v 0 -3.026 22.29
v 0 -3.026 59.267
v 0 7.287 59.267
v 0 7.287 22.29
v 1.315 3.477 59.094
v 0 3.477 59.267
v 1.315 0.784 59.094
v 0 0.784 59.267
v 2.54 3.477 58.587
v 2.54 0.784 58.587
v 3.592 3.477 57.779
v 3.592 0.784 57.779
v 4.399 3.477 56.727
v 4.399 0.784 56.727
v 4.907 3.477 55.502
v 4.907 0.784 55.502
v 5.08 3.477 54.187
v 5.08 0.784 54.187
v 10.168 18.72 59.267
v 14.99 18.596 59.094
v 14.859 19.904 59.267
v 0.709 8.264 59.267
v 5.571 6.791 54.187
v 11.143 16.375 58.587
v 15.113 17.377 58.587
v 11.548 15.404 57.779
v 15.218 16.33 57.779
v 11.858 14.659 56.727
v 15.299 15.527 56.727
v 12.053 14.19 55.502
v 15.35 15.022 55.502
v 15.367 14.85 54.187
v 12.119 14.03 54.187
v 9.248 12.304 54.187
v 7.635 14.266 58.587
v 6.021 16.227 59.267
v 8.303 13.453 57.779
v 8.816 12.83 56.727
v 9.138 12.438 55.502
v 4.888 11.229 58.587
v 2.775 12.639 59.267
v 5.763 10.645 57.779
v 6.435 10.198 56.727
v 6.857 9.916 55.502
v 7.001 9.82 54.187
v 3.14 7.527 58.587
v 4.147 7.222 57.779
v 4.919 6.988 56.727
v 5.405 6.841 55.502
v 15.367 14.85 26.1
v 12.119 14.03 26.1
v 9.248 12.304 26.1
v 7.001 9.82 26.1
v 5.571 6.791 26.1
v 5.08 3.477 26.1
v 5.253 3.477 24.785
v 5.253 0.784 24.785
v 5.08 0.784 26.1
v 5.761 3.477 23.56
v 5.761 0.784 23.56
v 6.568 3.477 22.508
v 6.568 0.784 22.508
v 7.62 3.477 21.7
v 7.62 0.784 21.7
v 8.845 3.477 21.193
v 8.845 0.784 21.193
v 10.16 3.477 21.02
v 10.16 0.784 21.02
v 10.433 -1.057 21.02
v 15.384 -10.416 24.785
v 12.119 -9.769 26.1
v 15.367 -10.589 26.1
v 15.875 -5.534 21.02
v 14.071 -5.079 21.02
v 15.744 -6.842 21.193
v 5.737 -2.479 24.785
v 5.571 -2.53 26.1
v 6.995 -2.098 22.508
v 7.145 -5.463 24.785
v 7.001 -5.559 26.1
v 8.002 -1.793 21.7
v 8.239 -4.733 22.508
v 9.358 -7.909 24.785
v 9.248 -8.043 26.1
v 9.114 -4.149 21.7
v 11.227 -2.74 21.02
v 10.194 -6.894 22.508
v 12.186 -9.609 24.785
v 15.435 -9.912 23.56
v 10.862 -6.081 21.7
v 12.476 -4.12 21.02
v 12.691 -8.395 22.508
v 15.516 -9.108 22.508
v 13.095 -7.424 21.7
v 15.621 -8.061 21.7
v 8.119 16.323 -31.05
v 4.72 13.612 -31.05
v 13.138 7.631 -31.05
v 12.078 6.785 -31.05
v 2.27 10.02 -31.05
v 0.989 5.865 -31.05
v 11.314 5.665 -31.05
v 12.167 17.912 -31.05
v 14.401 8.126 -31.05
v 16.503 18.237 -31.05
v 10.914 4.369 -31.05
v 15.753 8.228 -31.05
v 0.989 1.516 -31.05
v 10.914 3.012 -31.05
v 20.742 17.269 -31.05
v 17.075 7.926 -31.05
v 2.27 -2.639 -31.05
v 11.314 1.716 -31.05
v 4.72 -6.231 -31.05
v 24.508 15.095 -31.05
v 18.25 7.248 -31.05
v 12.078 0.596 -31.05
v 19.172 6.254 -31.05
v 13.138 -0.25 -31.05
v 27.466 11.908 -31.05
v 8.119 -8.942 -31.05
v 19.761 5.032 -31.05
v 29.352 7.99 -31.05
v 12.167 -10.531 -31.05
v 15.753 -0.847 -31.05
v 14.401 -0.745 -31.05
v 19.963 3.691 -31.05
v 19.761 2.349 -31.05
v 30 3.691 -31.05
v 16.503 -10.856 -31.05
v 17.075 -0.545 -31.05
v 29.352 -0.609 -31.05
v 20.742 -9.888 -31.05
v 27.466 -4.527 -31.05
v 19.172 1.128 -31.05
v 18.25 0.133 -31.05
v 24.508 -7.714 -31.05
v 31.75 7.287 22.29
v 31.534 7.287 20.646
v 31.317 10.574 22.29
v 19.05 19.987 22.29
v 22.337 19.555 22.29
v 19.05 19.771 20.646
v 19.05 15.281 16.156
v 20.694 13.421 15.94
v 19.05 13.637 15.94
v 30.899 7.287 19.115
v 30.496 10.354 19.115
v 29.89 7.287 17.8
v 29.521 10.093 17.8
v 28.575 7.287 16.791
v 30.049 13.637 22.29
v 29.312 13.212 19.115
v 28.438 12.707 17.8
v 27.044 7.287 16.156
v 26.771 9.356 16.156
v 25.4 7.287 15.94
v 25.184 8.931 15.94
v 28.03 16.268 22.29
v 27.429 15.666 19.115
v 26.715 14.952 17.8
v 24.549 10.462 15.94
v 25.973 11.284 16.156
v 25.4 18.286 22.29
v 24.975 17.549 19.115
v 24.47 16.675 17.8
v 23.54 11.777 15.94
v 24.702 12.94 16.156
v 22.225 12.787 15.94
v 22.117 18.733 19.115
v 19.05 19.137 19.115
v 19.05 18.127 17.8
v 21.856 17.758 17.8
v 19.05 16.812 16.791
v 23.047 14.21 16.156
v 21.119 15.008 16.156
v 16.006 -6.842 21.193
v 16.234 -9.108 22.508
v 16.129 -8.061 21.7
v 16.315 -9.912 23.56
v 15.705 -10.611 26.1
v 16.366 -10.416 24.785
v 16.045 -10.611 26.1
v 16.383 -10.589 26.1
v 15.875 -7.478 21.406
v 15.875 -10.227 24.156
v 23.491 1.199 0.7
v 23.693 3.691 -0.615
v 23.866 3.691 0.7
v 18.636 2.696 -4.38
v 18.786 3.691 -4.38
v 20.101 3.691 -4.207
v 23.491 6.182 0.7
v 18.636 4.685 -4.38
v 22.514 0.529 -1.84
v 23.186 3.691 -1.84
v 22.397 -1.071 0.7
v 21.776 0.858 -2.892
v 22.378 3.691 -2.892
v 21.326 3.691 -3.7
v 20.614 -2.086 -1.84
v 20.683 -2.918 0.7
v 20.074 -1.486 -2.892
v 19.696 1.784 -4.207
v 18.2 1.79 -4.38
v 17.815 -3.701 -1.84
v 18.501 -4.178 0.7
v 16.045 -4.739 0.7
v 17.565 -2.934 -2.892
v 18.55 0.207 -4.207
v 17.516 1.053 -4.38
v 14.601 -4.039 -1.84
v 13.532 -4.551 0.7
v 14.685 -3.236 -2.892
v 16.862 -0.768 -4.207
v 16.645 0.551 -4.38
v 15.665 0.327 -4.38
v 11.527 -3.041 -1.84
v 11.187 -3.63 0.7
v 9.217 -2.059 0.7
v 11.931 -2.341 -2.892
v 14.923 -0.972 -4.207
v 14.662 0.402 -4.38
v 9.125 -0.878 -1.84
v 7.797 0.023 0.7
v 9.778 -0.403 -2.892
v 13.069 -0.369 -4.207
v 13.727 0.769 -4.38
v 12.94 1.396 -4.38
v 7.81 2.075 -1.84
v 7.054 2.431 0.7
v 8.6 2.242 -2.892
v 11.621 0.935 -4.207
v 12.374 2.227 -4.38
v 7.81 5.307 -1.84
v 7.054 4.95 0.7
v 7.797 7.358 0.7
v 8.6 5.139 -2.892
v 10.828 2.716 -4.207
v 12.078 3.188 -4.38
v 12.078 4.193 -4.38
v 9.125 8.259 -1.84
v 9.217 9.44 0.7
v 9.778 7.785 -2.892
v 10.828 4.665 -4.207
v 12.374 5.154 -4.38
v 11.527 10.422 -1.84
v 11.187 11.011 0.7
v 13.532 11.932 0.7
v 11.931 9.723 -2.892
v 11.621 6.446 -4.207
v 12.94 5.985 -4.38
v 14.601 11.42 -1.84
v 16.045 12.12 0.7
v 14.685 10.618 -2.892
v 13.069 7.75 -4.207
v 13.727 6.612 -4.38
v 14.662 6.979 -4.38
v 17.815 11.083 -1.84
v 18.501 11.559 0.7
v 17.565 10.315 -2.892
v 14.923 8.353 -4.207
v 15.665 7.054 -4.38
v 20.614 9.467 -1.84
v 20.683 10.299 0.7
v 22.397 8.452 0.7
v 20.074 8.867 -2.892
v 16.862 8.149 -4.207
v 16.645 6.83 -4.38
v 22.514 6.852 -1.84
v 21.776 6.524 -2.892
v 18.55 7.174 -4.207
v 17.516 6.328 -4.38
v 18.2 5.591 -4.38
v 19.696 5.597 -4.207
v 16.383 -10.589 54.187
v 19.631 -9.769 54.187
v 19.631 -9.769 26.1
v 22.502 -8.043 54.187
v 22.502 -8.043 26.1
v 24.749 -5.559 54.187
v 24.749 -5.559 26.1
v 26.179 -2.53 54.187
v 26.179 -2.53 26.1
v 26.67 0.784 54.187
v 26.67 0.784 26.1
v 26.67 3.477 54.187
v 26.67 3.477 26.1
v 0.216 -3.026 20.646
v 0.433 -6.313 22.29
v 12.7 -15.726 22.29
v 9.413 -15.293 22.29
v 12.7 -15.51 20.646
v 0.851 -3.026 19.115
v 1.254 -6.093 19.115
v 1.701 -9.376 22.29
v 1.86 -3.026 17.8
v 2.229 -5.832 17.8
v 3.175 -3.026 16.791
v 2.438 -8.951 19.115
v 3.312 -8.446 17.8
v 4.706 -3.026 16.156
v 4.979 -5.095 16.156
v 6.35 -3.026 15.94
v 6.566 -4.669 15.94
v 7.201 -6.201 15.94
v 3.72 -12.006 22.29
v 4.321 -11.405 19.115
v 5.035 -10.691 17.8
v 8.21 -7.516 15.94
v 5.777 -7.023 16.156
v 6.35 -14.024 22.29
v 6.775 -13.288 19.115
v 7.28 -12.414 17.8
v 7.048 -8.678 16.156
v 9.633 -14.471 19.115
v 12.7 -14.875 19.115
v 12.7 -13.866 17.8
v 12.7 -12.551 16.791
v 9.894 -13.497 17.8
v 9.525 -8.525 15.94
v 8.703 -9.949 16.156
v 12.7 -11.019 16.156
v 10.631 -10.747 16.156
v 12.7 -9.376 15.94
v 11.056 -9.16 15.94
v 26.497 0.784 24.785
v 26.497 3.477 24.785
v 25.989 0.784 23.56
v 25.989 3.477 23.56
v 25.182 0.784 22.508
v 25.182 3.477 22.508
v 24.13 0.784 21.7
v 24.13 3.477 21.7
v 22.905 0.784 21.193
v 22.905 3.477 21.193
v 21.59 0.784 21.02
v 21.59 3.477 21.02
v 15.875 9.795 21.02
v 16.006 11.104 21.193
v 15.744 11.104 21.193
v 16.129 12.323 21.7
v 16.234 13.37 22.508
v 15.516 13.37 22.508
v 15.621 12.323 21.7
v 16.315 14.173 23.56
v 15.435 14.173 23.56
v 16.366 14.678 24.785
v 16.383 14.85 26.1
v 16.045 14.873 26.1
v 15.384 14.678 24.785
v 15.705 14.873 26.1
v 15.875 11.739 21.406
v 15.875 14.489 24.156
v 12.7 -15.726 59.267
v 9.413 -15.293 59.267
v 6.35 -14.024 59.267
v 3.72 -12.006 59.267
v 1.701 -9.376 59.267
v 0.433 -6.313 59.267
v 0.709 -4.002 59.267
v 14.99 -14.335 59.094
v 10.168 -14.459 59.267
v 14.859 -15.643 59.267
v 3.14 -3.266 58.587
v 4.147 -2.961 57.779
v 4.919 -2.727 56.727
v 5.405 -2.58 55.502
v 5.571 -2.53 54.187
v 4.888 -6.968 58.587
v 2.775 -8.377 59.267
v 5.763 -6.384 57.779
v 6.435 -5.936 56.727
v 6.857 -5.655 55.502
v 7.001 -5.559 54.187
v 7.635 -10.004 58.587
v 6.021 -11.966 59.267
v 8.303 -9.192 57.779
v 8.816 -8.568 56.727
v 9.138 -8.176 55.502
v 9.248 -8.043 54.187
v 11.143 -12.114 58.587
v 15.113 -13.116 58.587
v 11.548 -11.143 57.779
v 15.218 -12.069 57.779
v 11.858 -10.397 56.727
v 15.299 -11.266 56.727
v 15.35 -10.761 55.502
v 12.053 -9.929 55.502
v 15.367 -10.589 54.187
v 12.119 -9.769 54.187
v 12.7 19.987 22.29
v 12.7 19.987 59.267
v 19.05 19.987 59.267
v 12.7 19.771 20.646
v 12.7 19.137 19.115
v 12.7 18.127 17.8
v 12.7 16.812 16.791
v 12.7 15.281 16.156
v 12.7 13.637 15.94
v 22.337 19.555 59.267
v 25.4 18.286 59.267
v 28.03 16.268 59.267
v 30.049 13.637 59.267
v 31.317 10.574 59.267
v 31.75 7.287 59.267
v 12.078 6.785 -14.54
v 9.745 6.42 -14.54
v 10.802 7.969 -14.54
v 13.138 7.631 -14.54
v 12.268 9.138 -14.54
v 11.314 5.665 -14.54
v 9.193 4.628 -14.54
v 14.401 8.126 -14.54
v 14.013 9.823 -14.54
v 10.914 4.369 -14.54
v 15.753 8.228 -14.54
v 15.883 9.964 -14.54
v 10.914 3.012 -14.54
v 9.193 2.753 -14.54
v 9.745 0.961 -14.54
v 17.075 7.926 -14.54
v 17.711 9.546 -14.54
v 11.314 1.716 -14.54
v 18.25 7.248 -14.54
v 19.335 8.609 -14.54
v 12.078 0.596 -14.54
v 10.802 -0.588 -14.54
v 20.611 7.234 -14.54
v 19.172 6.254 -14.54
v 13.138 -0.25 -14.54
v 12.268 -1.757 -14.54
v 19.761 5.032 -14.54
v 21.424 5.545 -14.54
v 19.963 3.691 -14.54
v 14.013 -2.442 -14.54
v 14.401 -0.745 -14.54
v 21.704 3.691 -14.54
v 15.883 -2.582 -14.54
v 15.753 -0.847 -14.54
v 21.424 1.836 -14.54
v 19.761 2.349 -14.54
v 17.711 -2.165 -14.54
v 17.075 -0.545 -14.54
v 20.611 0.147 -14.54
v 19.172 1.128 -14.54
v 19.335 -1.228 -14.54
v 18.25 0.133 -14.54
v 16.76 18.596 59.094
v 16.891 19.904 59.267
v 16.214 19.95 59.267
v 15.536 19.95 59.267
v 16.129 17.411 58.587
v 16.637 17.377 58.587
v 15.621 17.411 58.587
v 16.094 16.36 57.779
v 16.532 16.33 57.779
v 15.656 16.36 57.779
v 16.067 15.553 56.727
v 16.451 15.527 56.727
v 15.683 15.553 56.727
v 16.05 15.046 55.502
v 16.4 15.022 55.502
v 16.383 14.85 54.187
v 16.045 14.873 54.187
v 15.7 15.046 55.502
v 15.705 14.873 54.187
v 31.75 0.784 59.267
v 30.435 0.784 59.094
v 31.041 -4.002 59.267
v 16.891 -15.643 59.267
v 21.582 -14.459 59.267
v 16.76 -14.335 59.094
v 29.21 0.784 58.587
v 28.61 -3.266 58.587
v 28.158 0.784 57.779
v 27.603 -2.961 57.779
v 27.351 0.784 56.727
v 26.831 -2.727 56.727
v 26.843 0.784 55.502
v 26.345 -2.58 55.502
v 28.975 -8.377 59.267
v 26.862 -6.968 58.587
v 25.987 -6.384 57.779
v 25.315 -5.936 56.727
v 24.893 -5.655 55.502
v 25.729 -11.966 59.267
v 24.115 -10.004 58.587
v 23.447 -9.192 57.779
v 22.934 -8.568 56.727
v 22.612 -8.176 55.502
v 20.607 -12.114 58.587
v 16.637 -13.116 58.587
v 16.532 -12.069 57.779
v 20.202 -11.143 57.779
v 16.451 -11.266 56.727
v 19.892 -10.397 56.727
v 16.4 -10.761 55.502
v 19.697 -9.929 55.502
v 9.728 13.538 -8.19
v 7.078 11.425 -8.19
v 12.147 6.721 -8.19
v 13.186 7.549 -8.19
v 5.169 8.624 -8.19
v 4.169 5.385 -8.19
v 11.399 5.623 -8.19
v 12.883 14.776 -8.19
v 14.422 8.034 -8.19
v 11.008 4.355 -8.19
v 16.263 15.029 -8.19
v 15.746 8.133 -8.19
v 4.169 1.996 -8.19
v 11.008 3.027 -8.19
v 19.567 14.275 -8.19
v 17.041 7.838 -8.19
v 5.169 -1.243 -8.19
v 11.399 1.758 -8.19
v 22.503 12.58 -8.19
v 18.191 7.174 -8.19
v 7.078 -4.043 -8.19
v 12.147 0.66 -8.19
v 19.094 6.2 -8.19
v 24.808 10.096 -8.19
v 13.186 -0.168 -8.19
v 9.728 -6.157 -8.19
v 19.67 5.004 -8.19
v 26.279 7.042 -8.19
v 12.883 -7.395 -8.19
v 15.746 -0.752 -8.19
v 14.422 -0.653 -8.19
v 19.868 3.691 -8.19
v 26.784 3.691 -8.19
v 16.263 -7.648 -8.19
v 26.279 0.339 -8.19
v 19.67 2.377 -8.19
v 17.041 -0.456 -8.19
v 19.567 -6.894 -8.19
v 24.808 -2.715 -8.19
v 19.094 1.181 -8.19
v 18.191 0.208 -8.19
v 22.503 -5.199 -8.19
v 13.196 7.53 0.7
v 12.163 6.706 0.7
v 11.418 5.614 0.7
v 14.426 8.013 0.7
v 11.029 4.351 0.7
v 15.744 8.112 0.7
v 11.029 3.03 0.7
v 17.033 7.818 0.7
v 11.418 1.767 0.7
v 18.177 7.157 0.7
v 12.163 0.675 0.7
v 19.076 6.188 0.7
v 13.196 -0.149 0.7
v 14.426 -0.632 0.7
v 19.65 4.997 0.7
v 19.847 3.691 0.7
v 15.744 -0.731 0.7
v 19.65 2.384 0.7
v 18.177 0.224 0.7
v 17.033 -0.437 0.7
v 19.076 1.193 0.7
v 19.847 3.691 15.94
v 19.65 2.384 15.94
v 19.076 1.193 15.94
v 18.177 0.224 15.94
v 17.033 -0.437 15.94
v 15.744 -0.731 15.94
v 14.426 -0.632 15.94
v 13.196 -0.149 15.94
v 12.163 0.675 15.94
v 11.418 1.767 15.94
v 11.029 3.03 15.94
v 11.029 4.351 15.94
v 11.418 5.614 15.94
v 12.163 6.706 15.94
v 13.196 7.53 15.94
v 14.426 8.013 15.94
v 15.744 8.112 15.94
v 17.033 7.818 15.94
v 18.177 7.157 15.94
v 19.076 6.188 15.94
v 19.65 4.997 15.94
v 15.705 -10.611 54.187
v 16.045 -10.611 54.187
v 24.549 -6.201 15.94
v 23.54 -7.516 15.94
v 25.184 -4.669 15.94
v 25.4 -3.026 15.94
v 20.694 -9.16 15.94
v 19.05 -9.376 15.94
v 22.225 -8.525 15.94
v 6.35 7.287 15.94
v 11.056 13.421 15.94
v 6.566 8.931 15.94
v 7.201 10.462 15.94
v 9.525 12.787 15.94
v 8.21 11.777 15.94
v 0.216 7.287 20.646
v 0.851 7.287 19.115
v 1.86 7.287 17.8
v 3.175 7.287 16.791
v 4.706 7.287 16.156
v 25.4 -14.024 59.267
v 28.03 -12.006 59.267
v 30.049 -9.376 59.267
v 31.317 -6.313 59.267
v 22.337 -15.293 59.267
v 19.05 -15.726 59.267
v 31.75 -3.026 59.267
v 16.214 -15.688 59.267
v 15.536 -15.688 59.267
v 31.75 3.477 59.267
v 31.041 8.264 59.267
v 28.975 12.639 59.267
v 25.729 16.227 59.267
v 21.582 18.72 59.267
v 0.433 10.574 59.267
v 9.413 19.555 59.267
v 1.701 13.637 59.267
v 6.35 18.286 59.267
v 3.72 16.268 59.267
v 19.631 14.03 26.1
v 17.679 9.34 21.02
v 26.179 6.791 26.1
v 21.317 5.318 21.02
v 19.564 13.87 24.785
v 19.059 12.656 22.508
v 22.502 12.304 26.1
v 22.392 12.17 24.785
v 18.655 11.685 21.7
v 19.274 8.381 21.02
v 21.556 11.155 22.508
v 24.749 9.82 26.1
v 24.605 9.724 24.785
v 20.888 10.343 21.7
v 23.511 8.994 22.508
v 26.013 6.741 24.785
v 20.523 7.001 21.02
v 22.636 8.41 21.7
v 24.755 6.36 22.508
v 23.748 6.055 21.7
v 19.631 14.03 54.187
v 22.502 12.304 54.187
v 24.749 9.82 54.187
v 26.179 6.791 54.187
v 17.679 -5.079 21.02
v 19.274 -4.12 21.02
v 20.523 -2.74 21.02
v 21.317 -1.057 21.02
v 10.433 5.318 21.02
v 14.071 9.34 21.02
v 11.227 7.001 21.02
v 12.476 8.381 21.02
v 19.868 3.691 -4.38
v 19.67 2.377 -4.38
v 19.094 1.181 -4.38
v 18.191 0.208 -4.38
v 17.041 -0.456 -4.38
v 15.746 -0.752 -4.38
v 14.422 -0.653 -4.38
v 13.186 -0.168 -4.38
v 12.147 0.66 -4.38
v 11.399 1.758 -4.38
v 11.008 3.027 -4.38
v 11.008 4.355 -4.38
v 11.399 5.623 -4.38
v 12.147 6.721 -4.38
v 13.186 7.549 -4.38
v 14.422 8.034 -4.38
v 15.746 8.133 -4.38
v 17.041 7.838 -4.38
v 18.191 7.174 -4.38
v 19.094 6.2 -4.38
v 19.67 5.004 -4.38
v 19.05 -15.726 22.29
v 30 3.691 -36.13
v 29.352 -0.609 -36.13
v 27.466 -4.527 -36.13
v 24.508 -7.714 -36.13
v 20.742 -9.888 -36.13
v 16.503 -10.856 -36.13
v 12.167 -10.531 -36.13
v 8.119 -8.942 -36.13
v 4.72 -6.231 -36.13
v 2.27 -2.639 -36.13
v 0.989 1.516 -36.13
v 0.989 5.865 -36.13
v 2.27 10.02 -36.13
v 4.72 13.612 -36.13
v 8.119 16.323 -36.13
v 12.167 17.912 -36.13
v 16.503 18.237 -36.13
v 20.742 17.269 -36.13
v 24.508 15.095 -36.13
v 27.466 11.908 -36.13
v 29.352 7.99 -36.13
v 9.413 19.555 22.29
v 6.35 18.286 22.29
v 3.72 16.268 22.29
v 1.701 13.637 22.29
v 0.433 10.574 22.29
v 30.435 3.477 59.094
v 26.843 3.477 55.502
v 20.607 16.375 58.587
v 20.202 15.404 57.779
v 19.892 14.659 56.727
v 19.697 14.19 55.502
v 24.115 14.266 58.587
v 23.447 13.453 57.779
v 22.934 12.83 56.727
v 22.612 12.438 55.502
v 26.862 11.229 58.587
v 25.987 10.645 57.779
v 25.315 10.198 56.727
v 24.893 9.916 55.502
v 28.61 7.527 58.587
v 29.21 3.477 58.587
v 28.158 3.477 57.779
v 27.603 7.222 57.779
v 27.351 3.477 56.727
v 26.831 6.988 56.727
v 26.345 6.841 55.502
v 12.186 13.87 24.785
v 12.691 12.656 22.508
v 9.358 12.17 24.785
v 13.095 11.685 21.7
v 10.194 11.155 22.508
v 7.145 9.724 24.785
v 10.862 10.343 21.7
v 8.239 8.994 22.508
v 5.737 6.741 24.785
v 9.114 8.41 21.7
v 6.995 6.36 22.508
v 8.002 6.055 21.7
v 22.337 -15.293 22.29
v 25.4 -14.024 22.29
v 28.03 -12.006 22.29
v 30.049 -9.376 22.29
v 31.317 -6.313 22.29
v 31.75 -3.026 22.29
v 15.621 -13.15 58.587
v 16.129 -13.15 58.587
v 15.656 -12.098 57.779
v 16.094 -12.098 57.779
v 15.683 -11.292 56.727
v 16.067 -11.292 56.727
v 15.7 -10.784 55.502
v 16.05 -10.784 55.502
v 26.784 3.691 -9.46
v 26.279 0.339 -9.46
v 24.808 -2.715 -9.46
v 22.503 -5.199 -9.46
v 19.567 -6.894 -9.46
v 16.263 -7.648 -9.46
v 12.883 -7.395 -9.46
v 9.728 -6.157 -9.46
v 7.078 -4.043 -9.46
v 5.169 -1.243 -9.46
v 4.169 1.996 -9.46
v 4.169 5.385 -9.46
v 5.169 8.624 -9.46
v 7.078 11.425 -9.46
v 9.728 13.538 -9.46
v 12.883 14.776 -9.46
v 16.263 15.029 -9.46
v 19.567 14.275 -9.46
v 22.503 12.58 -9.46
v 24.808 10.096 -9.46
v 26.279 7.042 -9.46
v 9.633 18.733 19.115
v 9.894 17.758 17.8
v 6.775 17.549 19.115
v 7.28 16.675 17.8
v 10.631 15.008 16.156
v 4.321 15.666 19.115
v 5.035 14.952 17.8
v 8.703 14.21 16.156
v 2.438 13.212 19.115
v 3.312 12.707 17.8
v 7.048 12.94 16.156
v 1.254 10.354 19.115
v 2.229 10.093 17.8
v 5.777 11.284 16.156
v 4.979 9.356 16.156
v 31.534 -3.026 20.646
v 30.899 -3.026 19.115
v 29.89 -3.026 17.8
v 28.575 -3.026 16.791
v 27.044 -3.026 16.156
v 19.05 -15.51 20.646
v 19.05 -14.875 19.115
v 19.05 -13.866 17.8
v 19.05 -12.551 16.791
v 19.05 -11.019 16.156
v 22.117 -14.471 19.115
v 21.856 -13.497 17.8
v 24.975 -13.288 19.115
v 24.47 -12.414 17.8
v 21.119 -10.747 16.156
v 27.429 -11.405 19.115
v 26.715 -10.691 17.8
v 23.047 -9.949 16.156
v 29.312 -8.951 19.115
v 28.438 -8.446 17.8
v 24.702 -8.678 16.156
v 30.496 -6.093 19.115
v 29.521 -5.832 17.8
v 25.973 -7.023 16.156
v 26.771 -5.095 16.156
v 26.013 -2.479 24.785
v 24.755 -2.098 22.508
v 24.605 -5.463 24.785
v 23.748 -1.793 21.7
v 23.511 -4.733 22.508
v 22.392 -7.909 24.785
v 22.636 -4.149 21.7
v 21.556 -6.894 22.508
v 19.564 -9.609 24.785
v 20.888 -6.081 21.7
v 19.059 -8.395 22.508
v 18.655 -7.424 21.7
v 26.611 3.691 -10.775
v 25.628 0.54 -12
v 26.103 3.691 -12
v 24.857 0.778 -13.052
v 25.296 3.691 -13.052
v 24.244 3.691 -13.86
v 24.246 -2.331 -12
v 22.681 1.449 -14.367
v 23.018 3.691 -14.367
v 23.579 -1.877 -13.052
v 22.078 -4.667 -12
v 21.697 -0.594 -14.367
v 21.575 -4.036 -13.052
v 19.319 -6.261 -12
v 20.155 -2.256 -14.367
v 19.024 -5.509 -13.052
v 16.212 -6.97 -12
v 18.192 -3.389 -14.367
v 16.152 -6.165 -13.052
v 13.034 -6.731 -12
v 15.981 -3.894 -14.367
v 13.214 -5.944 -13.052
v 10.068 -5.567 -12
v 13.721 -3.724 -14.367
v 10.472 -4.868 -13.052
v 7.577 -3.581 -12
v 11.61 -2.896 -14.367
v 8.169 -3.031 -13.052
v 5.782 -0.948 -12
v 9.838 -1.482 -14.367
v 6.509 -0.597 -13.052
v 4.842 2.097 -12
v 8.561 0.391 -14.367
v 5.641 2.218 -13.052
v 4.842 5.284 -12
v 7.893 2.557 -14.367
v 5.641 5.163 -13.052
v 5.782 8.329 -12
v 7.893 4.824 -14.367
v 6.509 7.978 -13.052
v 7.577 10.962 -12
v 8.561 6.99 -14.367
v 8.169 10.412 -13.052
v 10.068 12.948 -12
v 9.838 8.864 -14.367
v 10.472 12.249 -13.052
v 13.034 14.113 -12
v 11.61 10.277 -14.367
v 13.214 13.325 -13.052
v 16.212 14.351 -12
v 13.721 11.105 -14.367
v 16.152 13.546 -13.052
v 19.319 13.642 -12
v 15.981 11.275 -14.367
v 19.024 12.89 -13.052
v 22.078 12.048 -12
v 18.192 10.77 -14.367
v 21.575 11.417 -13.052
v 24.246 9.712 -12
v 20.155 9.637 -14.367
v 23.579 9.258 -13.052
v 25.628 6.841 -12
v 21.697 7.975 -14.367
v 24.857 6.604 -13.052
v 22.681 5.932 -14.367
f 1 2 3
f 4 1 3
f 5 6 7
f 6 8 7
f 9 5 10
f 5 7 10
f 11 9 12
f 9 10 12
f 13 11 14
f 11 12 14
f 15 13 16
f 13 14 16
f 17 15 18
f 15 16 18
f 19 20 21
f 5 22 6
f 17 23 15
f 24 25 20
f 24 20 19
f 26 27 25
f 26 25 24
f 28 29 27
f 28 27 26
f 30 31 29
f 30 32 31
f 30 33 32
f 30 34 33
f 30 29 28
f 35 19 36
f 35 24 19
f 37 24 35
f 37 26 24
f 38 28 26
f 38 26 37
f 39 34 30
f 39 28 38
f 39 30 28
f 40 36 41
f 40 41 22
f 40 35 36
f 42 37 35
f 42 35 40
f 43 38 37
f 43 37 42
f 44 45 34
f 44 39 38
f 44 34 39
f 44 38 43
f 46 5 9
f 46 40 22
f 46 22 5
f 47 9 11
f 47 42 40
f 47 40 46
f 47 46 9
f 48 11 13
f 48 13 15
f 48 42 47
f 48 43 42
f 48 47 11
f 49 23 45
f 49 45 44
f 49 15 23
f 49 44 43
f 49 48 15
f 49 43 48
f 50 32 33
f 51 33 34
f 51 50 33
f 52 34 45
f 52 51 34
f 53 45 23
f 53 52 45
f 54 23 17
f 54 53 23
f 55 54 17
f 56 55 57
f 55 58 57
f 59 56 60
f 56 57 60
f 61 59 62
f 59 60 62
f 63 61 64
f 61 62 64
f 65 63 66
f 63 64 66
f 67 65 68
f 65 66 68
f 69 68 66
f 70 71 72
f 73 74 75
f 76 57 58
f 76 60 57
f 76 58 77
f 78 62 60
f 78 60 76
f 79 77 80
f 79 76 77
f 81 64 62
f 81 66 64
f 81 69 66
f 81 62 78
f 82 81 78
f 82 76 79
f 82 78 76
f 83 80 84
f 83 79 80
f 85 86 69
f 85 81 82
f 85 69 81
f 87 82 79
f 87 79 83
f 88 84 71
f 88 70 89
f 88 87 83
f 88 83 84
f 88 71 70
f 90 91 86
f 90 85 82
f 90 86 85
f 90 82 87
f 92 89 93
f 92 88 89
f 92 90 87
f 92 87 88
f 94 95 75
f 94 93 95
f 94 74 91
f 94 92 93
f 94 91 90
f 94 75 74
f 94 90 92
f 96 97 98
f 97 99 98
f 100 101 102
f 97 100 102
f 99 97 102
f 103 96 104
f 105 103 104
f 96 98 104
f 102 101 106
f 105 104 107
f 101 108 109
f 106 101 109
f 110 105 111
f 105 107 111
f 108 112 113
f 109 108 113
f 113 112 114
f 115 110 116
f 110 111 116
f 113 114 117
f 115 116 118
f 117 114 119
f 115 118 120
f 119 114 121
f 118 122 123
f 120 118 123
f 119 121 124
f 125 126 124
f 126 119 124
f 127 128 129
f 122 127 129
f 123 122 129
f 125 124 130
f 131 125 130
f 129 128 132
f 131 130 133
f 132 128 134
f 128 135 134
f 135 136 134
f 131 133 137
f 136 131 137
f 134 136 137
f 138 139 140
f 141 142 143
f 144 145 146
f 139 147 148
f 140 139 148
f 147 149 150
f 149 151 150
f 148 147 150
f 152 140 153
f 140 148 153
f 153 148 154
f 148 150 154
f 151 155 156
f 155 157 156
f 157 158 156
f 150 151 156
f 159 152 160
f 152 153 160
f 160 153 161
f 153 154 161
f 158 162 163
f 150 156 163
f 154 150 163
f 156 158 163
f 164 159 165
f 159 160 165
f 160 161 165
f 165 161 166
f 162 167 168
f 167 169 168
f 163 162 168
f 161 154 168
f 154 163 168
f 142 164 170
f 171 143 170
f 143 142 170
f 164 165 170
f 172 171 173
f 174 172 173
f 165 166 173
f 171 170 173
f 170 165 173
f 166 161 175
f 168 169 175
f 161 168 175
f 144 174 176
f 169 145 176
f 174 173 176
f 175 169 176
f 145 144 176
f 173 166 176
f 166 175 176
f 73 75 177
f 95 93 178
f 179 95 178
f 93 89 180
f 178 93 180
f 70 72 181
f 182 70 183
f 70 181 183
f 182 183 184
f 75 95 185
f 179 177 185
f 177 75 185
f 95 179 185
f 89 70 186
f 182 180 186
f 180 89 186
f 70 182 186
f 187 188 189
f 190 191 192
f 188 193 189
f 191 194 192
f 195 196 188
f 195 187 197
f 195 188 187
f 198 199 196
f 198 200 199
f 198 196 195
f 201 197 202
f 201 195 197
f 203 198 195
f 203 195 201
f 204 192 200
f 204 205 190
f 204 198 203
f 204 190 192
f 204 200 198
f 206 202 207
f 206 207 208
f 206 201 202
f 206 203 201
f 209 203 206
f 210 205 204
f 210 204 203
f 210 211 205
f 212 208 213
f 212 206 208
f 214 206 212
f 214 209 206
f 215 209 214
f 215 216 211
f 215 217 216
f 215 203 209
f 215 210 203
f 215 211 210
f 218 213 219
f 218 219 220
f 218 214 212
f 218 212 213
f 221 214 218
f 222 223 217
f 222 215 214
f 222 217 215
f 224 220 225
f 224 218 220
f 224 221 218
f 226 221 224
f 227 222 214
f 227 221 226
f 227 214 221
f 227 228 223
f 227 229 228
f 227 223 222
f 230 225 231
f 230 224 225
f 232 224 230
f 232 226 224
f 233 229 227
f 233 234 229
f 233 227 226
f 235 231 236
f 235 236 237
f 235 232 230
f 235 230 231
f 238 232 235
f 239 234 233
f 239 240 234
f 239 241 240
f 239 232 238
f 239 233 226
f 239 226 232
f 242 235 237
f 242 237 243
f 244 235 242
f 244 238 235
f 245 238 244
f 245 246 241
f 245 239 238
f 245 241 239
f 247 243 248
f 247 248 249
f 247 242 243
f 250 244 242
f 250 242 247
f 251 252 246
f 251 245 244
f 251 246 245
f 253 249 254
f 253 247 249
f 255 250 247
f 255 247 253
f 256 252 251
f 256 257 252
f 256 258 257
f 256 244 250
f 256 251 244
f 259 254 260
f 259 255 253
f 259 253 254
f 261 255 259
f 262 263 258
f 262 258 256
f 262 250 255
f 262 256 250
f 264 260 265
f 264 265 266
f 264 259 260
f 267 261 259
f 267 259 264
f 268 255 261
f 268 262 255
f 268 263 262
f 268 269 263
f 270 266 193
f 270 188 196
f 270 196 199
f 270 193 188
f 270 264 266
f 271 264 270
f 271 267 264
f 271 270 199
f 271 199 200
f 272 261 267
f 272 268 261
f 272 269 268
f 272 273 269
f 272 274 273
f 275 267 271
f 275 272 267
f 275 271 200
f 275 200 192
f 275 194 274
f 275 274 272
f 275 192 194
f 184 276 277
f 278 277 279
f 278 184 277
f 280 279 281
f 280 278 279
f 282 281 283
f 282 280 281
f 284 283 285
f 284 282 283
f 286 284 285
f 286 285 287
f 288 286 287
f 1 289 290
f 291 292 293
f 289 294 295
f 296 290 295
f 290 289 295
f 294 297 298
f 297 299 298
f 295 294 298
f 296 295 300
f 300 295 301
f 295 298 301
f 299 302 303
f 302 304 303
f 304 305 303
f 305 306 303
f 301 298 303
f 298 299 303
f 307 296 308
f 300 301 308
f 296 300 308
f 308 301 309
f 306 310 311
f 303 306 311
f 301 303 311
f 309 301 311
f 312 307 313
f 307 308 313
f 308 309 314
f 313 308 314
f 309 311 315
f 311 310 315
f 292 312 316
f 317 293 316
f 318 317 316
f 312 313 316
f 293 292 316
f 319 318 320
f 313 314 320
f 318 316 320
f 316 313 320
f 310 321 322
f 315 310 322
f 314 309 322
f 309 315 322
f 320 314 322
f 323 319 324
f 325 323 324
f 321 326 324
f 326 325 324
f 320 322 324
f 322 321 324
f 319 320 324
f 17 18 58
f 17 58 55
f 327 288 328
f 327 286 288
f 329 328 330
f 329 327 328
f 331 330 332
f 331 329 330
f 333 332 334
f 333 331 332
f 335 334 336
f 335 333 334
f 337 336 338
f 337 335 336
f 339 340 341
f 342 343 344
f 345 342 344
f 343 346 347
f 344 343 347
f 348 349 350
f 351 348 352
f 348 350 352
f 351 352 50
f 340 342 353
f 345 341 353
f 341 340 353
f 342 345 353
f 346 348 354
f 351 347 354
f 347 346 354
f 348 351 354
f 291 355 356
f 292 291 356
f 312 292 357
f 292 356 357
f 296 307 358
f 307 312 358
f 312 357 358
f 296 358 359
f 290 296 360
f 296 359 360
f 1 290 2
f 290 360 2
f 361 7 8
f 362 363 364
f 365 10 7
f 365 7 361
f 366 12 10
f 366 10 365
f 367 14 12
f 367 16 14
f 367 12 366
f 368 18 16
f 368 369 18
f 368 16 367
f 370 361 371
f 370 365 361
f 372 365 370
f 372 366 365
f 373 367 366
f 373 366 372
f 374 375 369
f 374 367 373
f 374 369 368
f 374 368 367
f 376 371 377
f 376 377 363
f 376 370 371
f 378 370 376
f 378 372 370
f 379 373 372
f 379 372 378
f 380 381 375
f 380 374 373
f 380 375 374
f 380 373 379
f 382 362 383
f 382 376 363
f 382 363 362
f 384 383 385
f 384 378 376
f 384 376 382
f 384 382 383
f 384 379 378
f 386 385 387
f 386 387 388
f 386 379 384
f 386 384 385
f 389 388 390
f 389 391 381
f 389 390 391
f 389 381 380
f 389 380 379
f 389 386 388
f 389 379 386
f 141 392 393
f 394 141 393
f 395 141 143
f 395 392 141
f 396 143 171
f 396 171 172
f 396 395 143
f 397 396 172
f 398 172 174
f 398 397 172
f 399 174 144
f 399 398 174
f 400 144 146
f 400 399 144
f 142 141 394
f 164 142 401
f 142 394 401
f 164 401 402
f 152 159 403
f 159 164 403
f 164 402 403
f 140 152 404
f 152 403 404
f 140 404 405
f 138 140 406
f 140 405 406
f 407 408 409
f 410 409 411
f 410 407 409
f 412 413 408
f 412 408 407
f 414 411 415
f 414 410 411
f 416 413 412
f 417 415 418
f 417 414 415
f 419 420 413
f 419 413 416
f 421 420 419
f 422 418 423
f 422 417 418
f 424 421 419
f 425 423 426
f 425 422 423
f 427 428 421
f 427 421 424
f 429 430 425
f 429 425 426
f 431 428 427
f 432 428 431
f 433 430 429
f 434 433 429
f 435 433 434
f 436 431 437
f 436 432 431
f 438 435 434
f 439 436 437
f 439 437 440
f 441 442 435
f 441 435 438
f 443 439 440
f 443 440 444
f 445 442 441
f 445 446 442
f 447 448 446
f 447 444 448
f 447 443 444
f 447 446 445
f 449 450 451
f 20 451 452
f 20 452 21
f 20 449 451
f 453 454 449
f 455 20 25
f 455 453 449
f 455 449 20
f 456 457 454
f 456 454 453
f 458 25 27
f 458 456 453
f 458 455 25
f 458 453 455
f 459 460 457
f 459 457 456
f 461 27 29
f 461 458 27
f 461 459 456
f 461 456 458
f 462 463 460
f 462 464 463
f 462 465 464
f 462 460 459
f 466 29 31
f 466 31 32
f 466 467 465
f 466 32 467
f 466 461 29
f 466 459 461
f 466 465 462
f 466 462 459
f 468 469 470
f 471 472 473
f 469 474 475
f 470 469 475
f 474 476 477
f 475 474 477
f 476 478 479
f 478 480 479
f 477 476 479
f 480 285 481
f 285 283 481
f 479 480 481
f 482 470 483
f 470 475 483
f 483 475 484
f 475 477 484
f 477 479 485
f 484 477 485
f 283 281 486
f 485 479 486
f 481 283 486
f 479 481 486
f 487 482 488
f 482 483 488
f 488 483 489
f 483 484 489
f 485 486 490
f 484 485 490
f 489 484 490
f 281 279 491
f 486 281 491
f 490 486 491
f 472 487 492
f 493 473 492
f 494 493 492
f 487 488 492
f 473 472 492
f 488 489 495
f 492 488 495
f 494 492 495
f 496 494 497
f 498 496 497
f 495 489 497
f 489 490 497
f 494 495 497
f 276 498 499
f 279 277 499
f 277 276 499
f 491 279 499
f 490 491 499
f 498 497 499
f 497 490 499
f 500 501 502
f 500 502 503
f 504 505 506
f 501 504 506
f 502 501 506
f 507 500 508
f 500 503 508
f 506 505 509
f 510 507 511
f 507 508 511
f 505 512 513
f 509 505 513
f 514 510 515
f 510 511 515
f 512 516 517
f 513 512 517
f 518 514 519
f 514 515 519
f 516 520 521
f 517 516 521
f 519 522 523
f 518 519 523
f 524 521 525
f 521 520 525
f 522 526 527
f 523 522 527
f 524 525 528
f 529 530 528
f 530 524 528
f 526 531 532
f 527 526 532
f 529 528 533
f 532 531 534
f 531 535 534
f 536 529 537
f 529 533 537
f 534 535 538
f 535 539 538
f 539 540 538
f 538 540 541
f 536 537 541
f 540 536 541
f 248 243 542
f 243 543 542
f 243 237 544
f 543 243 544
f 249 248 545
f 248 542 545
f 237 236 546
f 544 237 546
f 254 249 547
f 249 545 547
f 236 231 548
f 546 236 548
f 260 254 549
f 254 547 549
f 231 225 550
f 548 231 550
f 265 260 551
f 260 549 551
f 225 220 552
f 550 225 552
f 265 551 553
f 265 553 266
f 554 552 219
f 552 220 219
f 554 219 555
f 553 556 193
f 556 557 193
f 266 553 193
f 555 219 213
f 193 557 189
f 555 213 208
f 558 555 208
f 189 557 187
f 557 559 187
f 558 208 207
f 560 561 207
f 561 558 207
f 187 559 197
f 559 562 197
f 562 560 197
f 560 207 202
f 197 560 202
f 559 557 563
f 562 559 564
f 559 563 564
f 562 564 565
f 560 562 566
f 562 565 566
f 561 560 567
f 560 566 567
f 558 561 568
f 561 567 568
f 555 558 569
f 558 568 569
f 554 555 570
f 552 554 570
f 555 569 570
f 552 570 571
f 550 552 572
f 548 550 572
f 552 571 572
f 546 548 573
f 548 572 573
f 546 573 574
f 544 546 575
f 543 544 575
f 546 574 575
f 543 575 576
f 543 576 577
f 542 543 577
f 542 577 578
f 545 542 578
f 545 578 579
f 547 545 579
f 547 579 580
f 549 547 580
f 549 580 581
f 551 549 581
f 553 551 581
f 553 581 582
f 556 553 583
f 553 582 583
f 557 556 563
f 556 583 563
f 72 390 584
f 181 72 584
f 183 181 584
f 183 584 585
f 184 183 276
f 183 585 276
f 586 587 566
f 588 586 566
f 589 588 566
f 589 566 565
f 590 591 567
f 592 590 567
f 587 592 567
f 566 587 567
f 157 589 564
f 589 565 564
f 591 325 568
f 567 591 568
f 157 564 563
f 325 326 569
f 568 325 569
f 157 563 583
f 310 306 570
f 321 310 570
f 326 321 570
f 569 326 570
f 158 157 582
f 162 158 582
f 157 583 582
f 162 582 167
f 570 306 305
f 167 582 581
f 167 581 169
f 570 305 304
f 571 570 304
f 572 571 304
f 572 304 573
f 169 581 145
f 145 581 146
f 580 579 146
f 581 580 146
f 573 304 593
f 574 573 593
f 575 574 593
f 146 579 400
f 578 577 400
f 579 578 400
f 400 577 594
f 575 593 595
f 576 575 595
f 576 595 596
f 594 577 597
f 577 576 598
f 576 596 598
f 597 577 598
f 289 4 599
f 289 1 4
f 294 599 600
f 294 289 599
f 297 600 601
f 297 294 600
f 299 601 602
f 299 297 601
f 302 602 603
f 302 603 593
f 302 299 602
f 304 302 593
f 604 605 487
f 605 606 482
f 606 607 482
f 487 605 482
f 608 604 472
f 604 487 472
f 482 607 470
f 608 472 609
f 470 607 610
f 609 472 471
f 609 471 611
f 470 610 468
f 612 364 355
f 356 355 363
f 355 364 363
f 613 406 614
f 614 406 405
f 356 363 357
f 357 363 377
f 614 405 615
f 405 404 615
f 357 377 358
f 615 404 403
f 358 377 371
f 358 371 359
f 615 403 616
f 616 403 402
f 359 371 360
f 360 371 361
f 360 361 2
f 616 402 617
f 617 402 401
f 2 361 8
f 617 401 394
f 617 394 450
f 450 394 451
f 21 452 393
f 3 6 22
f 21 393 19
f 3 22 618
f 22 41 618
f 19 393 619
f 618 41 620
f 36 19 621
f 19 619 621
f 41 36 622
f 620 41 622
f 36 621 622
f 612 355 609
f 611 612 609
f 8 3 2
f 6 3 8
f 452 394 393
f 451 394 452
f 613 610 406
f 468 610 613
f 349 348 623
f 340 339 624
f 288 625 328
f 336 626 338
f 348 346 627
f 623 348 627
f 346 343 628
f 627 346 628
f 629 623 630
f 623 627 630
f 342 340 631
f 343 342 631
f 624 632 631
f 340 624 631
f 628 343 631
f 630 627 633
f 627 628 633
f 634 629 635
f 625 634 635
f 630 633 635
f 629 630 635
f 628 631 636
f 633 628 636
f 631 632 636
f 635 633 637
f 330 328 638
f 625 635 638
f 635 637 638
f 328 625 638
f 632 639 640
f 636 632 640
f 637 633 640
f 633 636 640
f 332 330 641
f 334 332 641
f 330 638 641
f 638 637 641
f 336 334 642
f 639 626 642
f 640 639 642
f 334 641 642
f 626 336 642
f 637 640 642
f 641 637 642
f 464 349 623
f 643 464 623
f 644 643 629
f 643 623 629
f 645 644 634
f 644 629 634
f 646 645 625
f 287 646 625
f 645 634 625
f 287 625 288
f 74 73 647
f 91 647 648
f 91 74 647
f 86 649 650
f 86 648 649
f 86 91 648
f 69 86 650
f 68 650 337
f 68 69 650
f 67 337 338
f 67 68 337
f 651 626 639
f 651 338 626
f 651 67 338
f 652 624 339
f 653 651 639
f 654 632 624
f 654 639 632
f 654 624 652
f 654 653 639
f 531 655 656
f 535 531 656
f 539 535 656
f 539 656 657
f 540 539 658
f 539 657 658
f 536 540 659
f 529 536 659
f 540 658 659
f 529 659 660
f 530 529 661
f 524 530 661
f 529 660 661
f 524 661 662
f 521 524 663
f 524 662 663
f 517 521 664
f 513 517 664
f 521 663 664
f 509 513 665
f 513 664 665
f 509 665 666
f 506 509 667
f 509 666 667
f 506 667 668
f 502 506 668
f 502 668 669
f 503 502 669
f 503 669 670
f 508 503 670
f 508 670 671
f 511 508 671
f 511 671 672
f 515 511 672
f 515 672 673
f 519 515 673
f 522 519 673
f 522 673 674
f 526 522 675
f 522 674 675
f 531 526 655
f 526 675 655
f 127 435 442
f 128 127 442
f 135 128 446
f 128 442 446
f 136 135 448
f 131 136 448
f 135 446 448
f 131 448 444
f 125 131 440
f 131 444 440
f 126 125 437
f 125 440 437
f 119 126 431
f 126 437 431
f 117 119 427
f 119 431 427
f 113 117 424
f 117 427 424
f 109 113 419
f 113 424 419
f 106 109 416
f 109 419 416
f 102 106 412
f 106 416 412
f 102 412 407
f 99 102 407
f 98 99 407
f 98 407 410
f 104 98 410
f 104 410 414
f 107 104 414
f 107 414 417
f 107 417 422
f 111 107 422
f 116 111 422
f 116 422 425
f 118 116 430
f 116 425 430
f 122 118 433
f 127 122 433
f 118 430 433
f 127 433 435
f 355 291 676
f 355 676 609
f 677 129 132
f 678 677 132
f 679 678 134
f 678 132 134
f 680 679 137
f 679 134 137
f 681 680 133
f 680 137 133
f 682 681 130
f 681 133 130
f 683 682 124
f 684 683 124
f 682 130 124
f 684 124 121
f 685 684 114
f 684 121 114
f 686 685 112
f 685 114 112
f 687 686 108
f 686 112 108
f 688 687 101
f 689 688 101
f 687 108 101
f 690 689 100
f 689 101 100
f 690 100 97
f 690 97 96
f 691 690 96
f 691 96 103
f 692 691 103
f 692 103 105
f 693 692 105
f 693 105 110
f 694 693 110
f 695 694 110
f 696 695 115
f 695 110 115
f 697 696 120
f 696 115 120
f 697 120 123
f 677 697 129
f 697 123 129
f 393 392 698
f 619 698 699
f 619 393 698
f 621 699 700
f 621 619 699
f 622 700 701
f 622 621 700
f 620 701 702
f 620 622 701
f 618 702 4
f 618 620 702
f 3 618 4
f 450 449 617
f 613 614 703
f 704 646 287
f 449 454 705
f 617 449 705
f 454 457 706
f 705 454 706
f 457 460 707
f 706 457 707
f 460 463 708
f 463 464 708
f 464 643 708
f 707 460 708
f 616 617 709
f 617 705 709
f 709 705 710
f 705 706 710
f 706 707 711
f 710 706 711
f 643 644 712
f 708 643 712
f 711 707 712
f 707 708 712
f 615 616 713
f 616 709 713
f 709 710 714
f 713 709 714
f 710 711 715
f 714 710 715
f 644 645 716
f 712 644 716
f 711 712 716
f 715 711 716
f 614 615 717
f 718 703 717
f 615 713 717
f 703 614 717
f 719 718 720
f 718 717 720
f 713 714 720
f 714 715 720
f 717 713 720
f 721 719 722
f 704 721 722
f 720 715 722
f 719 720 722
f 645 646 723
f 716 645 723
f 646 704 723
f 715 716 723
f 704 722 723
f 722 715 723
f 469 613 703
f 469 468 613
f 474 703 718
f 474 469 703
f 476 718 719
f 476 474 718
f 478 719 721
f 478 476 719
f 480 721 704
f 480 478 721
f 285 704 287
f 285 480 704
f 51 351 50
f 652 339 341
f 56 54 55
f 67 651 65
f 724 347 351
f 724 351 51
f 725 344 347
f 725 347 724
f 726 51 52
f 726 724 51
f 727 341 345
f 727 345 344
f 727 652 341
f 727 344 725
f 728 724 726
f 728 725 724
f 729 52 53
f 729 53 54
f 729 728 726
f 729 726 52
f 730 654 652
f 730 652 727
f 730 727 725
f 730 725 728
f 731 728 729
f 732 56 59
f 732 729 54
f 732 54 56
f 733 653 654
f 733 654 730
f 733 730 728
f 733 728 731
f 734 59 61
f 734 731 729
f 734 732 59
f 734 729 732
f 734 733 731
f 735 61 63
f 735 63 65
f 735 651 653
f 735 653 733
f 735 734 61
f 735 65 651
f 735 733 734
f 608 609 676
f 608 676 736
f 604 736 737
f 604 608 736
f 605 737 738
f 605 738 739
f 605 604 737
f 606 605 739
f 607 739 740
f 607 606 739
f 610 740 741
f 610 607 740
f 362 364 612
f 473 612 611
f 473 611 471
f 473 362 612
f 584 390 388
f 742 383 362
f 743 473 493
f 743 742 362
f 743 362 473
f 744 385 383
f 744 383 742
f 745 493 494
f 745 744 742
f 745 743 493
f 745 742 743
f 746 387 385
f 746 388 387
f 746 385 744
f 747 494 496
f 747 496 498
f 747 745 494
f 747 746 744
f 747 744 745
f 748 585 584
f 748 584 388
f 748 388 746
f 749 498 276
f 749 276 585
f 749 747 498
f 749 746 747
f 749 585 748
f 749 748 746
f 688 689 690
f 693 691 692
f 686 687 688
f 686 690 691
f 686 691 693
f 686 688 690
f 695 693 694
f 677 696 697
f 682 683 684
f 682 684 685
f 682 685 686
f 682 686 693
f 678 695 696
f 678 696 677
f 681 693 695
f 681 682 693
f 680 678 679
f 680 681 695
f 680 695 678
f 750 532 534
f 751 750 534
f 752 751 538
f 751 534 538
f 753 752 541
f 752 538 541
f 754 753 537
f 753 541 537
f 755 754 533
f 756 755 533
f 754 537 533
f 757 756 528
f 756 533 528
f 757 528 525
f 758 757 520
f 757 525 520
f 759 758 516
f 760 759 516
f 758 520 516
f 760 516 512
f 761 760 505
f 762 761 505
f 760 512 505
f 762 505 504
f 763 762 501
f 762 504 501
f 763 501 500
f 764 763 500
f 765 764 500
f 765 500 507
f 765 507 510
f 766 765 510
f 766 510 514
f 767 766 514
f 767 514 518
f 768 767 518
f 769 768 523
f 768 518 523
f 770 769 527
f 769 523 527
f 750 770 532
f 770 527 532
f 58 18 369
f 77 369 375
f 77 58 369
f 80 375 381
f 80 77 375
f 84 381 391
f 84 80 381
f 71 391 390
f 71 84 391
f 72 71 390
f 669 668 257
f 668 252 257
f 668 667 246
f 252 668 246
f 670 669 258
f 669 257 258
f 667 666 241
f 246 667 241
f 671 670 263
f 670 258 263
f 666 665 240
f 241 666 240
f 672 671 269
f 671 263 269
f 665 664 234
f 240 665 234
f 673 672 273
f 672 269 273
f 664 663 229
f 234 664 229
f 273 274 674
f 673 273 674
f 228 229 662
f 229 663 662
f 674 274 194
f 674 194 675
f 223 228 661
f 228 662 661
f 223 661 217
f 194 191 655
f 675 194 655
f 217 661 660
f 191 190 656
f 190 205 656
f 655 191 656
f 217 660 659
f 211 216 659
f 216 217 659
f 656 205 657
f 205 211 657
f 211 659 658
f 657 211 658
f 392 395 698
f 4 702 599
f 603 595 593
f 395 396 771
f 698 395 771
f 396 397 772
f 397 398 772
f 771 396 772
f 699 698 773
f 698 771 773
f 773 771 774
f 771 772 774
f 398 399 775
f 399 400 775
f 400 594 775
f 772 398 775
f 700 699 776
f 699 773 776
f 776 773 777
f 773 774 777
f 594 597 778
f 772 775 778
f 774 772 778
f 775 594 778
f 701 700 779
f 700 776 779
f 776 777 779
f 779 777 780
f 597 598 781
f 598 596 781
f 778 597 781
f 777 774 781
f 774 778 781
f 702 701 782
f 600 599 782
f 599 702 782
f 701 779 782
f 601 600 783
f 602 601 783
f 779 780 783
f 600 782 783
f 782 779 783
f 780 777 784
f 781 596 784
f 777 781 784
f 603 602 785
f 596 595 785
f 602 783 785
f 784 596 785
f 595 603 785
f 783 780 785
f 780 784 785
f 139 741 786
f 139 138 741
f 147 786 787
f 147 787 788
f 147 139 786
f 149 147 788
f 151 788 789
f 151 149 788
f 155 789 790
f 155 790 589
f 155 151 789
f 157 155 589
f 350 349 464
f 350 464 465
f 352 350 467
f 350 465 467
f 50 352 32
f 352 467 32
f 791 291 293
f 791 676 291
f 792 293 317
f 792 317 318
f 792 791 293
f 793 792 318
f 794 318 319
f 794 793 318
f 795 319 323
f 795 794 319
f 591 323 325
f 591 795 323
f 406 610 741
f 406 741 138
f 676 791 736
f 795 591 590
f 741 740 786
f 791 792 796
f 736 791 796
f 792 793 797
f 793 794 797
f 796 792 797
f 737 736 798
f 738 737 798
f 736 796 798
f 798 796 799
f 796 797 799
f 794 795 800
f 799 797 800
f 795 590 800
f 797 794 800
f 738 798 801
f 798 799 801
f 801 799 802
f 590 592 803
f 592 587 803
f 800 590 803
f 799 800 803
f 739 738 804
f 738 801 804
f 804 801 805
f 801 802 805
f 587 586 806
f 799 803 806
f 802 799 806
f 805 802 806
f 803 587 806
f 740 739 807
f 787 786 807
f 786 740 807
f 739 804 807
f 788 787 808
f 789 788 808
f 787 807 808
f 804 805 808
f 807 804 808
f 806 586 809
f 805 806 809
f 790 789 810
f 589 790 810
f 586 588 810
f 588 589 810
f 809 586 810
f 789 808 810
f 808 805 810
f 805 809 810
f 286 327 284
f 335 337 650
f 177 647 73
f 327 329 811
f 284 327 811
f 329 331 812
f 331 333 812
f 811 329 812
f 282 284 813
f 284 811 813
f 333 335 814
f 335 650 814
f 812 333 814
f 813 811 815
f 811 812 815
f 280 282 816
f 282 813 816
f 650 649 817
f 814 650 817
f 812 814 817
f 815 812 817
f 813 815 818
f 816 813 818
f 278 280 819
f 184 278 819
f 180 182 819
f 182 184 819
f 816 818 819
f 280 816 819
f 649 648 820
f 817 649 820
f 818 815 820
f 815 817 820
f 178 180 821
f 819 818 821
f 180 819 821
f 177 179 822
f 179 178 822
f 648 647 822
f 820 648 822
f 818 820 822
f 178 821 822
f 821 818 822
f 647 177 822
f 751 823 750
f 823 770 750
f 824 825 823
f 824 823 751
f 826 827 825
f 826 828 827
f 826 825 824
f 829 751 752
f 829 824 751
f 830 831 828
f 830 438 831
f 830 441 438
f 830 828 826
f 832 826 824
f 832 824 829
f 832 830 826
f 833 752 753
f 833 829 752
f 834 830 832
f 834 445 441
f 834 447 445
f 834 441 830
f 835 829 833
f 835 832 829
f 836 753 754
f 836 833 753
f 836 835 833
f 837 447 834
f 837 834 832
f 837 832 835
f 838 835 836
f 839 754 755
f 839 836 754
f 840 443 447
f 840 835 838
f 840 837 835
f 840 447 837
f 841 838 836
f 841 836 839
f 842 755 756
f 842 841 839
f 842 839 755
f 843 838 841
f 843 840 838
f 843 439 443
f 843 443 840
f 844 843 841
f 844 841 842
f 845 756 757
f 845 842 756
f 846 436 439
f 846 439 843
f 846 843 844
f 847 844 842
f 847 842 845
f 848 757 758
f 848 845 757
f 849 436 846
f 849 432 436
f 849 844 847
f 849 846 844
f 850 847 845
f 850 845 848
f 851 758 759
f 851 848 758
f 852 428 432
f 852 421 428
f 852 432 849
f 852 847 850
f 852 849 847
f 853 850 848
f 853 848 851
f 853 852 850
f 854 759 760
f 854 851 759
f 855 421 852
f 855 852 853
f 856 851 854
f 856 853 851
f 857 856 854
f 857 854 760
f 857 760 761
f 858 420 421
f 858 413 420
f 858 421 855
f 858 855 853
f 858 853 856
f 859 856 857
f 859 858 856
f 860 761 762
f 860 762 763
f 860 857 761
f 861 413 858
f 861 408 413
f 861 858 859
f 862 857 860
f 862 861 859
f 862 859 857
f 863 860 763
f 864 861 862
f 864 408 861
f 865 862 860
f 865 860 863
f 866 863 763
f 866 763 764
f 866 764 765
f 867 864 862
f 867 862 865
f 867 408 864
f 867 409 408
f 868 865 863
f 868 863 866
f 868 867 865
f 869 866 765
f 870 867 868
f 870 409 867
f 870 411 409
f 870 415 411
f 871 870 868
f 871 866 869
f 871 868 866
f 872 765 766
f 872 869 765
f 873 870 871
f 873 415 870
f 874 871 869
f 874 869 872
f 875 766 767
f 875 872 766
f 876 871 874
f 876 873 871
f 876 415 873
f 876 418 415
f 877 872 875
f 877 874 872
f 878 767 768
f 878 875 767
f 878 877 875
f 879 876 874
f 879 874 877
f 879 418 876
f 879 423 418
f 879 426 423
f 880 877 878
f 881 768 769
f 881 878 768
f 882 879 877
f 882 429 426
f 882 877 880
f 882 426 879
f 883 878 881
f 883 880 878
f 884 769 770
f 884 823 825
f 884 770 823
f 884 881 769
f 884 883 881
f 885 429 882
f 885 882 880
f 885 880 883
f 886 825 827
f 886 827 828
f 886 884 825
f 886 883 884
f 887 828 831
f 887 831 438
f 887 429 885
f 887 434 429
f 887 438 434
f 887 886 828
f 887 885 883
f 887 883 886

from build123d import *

# Parameters (mm, degrees)
F0_W        = 35.713232588
F0_H        = 43.3274284005
F1_DEPTH    = 31.75
F2_T        = -5.08
F3_R        = 12.7
F4_T1_DEPTH = 38.2474284005
F5_R        = 6.35
F6_R        = 5.07999
F7_R        = 4.4336766497
F8_DEPTH    = 15.24
F9_R        = 8.453024689
F10_DEPTH   = 5.08
F11_R       = 5.07999
F12_R       = 4.45495875
F13_DEPTH   = 3.81
F14_R       = 11.3706075555
F15_DEPTH   = 6.35
F16_R       = 5.08
F17_R       = 4.5498563982
F18_DEPTH   = 16.51
F19_R       = 14.5872026809
F20_DEPTH   = 5.08


# Not quite as in the source:
# - a fillet or chamfer that OpenCascade refuses, or shapes differently, is made with other operations: its cross-section is extruded or revolved along the edge and cut away or added
# - a fillet or chamfer is up to 0.001 mm smaller than in the source, because OpenCascade refuses the exact size


with BuildPart() as f1:
    # F0 (on Right) → F1 (new body)
    with BuildSketch(Plane.YZ):
        with Locations((2.1306423005, 37.6035124063)):
            Rectangle(F0_W, F0_H)
    extrude(amount=F1_DEPTH)

    # F2
    f2_openings = [f1.faces().sort_by_distance(p)[0] for p in [
        (15.875, 2.130642, 59.267227),
    ]]
    offset(amount=F2_T, openings=f2_openings)

    # F3
    f3_edges = [f1.edges().sort_by_distance(p)[0] for p in [
        (0, -15.725974, 37.603512),
        (31.75, -15.725974, 37.603512),
        (31.75, 19.987259, 37.603512),
        (0, 19.987259, 37.603512),
    ]]
    fillet(f3_edges, radius=F3_R)

    # F4: fillet of radius 11.43 on 4 edges, made by hand

    # F4_s2 → F4_t1 (join)
    with BuildSketch(Plane.XY.offset(21.0197982061)):
        with BuildLine():
            ThreePointArc((5.08, 0.7840260065), (8.427769491, -7.2982045025), (16.51, -10.6459739935))
            Line((16.51, -10.6459739935), (5.08, -10.6459739935))
            Line((5.08, -10.6459739935), (5.08, 0.7840260065))
        make_face()
        with BuildLine():
            ThreePointArc((16.51, 14.9072585945), (8.427769491, 11.5594891034), (5.08, 3.4772585945))
            Line((5.08, 3.4772585945), (5.08, 14.9072585945))
            Line((5.08, 14.9072585945), (16.51, 14.9072585945))
        make_face()
        with BuildLine():
            ThreePointArc((15.24, 14.9072585945), (23.322230509, 11.5594891034), (26.67, 3.4772585945))
            Line((26.67, 3.4772585945), (26.67, 14.9072585945))
            Line((26.67, 14.9072585945), (15.24, 14.9072585945))
        make_face()
        with BuildLine():
            ThreePointArc((15.24, -10.6459739935), (23.322230509, -7.2982045025), (26.67, 0.7840260065))
            Line((26.67, 0.7840260065), (26.67, -10.6459739935))
            Line((26.67, -10.6459739935), (15.24, -10.6459739935))
        make_face()
    extrude(amount=F4_T1_DEPTH)

    # F5
    f5_edges = [f1.edges().sort_by_distance(p)[0] for p in [
        (15.875, -15.725974, 15.939798),
        (3.719744, -12.00623, 15.939798),
        (0, 2.130642, 15.939798),
        (3.719744, 16.267515, 15.939798),
        (15.875, 19.987259, 15.939798),
        (28.030256, 16.267515, 15.939798),
        (31.75, 2.130642, 15.939798),
        (28.030256, -12.00623, 15.939798),
    ]]
    fillet(f5_edges, radius=F5_R)

    # F6 (radius 5.08 in the source; OpenCascade refuses exactly that, so slightly less here)
    f6_edges = [f1.edges().sort_by_distance(p)[0] for p in [
        (15.875, 14.889606, 40.143512),
        (26.67, 3.477259, 40.143512),
        (23.543702, 11.331775, 21.019798),
        (23.543702, 11.331775, 59.267227),
        (15.875, -10.628321, 40.143512),
        (26.67, 0.784026, 40.143512),
        (23.543702, -7.07049, 21.019798),
        (23.543702, -7.07049, 59.267227),
        (5.08, 3.477259, 40.143512),
        (8.206298, 11.331775, 21.019798),
        (8.206298, 11.331775, 59.267227),
        (5.08, 0.784026, 40.143512),
        (8.206298, -7.07049, 21.019798),
        (8.206298, -7.07049, 59.267227),
    ]]
    fillet(f6_edges, radius=F6_R)

    # F7 (on face) → F8 (join)
    with BuildSketch(Plane(origin=(0, 0, 15.9397982061), x_dir=(1, 0, 0), z_dir=(0, 0, -1))):
        with Locations((15.4130682349, -3.6905435845)):
            Circle(F7_R)
    extrude(amount=F8_DEPTH)

    # F9 (on face) → F10 (join)
    with BuildSketch(Plane(origin=(0, 0, 0.6997982061), x_dir=(1, 0, 0), z_dir=(0, 0, -1))):
        with Locations((15.4130682349, -3.6905435845)):
            Circle(F9_R)
    extrude(amount=F10_DEPTH)

    # F11 (radius 5.08 in the source; OpenCascade refuses exactly that, so slightly less here)
    f11_edges = [f1.edges().sort_by_distance(p)[0] for p in [
        (6.960044, 3.690544, -4.380202),
    ]]
    fillet(f11_edges, radius=F11_R)

    # F12 (on face) → F13 (join)
    with BuildSketch(Plane(origin=(0, 0, -4.3802017939), x_dir=(1, 0, 0), z_dir=(0, 0, -1))):
        with Locations((15.4130682349, -3.6905435845)):
            Circle(F12_R)
    extrude(amount=F13_DEPTH)

    # F14 (on face) → F15 (join)
    with BuildSketch(Plane(origin=(0, 0, -8.1902017939), x_dir=(1, 0, 0), z_dir=(0, 0, -1))):
        with Locations((15.4130682349, -3.6905435845)):
            Circle(F14_R)
    extrude(amount=F15_DEPTH)

    # F16
    f16_edges = [f1.edges().sort_by_distance(p)[0] for p in [
        (4.042461, 3.690544, -14.540202),
    ]]
    fillet(f16_edges, radius=F16_R)

    # F17 (on face) → F18 (join)
    with BuildSketch(Plane(origin=(0, 0, -14.5402017939), x_dir=(1, 0, 0), z_dir=(0, 0, -1))):
        with Locations((15.4130682349, -3.6905435845)):
            Circle(F17_R)
    extrude(amount=F18_DEPTH)

    # F19 (on face) → F20 (join)
    with BuildSketch(Plane(origin=(0, 0, -31.0502017939), x_dir=(1, 0, 0), z_dir=(0, 0, -1))):
        with Locations((15.4130682349, -3.6905435845)):
            Circle(F19_R)
    extrude(amount=F20_DEPTH)


solid = f1.part
